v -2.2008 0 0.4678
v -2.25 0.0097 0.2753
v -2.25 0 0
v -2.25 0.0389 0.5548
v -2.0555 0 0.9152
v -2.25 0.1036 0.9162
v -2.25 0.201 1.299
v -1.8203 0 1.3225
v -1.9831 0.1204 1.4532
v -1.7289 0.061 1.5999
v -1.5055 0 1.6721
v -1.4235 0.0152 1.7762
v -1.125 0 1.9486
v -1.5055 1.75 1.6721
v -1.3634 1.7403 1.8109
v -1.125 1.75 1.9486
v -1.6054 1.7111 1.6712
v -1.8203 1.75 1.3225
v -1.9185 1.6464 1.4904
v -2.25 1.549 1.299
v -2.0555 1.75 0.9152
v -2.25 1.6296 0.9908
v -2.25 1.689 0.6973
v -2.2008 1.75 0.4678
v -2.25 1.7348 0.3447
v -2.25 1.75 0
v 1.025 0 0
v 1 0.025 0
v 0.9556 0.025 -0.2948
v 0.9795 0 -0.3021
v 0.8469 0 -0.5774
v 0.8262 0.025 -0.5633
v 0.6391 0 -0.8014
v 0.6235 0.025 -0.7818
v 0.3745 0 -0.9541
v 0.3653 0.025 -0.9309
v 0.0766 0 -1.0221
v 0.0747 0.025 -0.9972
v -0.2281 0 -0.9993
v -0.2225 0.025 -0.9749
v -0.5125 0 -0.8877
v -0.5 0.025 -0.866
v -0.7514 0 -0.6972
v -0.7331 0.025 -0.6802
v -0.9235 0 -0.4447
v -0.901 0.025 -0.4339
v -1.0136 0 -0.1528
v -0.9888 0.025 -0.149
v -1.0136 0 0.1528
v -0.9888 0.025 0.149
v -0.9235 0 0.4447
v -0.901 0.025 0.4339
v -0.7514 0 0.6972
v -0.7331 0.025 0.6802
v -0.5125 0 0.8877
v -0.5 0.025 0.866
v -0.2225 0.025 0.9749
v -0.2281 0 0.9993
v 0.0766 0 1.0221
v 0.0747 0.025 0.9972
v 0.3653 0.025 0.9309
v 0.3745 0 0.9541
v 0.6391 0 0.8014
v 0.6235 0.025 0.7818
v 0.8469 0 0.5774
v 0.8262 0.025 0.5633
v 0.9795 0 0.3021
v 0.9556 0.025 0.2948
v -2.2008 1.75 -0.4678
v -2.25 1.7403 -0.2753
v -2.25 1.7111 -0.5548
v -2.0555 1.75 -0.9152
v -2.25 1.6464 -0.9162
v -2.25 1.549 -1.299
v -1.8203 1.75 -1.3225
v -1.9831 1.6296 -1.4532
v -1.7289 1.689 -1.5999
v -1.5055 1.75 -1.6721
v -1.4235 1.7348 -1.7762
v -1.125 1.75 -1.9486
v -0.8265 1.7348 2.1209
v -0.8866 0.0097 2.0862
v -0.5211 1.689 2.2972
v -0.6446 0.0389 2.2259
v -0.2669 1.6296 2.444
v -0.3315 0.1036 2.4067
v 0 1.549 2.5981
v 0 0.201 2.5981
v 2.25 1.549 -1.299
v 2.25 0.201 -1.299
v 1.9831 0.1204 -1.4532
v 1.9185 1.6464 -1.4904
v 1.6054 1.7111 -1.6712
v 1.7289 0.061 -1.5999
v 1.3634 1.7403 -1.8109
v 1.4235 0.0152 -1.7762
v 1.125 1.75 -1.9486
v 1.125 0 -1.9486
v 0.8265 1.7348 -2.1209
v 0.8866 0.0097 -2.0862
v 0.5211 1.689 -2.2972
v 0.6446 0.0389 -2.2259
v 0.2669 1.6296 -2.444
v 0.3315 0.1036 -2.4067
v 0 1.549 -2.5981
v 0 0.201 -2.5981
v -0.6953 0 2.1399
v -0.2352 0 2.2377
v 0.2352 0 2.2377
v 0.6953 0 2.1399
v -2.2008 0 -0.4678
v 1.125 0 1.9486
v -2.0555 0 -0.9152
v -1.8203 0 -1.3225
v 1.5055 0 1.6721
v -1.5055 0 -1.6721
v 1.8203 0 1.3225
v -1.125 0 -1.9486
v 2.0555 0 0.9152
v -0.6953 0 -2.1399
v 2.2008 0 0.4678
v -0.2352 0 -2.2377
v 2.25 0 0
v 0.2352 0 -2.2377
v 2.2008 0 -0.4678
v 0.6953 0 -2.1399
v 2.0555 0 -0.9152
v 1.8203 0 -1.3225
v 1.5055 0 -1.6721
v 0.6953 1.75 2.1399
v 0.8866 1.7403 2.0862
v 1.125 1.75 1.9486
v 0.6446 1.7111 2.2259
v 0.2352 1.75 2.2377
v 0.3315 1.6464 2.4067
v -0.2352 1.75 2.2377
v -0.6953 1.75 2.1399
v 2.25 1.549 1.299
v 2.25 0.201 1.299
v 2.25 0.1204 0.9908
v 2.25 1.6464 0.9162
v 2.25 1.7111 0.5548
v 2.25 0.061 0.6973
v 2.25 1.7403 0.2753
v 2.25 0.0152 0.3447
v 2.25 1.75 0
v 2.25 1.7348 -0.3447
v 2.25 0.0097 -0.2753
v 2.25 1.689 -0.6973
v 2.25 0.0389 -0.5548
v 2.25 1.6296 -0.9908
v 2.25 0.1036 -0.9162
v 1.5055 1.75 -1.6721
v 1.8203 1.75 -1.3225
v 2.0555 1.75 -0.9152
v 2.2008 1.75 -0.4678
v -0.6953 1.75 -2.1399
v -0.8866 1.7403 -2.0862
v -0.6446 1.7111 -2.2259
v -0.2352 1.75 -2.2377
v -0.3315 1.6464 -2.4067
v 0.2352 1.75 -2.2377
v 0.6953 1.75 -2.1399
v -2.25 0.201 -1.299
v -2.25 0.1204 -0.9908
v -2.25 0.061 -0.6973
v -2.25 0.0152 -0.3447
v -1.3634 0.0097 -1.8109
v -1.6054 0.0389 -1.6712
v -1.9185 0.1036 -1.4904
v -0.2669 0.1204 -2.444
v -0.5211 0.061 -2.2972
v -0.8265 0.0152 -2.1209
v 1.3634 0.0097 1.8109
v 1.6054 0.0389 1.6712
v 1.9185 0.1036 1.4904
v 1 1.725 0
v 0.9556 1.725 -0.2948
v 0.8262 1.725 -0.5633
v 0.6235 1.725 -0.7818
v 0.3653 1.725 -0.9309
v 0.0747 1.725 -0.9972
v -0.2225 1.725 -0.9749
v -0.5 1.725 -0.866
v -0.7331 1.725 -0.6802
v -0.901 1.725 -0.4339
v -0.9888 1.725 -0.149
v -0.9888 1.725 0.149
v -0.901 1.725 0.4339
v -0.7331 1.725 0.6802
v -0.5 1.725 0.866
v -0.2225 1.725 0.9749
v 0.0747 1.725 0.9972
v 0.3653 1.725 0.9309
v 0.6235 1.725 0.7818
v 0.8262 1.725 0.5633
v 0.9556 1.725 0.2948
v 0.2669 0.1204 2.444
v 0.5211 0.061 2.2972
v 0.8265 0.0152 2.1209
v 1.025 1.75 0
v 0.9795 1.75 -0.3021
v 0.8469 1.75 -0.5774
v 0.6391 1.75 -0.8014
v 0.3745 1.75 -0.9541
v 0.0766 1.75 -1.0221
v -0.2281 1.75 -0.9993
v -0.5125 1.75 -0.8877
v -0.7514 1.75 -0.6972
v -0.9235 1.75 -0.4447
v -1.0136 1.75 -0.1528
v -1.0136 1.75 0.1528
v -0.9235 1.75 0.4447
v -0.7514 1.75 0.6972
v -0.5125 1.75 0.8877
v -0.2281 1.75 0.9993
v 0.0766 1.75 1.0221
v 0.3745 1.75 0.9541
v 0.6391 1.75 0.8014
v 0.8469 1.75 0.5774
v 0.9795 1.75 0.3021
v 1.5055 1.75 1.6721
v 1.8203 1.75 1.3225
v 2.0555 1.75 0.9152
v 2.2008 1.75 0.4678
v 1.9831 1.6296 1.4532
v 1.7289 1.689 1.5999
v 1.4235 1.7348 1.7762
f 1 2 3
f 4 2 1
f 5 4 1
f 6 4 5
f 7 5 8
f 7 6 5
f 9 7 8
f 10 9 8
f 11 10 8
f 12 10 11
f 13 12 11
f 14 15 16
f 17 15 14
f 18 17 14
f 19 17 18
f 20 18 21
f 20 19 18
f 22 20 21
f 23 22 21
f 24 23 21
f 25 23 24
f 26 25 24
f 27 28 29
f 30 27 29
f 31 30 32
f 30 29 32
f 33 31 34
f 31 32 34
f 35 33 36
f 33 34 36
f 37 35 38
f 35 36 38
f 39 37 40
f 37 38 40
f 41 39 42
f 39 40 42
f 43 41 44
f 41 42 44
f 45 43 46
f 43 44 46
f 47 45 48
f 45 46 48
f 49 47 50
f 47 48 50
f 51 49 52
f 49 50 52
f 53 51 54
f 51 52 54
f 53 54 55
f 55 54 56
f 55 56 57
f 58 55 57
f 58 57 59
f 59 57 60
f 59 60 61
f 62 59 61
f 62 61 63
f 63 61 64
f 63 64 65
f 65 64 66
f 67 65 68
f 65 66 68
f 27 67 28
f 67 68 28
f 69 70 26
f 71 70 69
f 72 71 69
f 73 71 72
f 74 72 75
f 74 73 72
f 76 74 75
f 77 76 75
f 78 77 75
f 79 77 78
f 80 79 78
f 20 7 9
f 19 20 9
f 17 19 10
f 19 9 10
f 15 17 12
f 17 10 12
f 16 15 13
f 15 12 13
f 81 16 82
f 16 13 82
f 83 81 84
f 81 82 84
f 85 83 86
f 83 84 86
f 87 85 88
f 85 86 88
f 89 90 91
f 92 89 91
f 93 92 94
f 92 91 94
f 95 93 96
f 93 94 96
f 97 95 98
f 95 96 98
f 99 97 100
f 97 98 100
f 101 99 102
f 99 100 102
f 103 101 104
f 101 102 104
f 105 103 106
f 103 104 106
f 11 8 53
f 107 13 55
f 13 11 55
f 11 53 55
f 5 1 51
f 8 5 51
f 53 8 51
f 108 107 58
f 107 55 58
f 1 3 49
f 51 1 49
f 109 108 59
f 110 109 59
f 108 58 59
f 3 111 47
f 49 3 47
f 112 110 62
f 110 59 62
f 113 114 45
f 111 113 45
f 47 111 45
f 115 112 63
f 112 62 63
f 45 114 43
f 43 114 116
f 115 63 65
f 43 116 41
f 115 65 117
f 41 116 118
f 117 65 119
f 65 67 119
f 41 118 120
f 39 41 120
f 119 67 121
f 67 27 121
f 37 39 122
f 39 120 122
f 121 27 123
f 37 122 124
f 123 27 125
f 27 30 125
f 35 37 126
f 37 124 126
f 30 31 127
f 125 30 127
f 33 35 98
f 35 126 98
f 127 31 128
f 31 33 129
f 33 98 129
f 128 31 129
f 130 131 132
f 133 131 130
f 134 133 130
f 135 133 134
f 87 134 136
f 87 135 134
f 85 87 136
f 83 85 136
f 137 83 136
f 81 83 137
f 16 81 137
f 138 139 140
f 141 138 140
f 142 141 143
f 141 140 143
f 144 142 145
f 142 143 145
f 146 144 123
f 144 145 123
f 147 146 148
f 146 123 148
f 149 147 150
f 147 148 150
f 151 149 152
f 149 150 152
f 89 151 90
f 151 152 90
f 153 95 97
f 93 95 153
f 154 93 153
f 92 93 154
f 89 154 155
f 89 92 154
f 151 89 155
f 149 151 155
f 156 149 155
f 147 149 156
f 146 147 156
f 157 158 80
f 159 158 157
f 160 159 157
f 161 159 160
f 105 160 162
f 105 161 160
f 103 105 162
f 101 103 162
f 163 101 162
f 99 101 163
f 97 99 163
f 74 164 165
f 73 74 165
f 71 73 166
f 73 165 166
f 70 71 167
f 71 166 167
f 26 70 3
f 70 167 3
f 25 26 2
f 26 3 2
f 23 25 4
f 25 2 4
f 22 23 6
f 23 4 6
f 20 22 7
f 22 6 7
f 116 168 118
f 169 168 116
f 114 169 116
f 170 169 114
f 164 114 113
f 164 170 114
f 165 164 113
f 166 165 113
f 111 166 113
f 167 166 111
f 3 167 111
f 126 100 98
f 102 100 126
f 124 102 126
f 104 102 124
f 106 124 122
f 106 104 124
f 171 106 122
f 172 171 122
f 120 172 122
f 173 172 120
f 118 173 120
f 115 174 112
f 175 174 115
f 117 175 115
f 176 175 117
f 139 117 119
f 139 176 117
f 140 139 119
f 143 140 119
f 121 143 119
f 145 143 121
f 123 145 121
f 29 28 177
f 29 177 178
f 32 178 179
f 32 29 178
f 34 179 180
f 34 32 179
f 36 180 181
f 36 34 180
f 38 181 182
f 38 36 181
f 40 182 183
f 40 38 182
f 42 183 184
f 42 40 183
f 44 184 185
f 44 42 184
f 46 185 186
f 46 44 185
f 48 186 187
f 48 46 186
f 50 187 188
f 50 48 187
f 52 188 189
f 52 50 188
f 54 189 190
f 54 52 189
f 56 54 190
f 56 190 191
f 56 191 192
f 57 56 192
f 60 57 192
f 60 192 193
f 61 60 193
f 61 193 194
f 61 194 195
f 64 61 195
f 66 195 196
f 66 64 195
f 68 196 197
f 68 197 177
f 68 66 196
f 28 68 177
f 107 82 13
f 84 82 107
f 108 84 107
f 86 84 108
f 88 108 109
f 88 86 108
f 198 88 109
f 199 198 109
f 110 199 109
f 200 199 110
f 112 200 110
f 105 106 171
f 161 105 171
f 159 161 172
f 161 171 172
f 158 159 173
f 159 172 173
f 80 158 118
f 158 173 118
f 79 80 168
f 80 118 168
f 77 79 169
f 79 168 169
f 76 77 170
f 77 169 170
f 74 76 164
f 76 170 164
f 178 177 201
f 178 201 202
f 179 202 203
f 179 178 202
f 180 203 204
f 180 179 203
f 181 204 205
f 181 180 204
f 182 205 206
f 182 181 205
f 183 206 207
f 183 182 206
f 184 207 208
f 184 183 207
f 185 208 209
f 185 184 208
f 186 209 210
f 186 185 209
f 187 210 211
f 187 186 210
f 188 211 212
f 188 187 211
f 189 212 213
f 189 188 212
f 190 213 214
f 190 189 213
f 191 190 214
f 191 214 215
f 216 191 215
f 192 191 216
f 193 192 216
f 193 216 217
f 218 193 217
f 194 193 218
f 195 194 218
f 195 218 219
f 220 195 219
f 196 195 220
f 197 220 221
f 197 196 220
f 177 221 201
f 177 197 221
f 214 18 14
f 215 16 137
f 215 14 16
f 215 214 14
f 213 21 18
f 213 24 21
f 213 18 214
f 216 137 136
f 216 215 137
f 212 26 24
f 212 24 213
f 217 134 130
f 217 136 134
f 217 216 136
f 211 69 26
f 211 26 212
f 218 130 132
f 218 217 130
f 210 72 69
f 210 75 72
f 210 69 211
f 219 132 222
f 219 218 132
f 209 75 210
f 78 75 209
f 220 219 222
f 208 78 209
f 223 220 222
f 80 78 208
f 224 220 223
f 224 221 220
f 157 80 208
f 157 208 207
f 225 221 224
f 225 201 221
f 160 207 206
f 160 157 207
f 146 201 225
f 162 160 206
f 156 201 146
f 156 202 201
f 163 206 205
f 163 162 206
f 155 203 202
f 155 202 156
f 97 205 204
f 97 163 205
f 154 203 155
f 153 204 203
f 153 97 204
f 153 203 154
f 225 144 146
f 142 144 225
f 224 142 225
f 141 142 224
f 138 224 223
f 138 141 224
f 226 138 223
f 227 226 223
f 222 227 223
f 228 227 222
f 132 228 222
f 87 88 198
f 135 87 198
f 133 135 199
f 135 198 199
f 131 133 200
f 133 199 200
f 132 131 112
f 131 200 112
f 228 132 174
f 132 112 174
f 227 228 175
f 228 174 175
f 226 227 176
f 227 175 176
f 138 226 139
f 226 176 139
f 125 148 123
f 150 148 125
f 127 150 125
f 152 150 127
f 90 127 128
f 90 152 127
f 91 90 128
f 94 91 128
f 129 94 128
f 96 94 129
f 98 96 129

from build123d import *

# Parameters (mm, degrees)
SKETCH1_R           = 1
BOSS_EXTRUDE1_DEPTH = 1.75
SKETCH2_OUTSIDE_W   = 13.98
SKETCH2_OUTSIDE_H   = 14.676
SKETCH2_OUTSIDE_R   = 2.25
CUT_EXTRUDE1_DEPTH  = 1.75
CUT_EXTRUDE1_TAPER  = 60
SKETCH3_OUTSIDE_W   = 13.98
SKETCH3_OUTSIDE_H   = 14.676
SKETCH3_OUTSIDE_R   = 2.25
CUT_EXTRUDE3_DEPTH  = 1.75
CUT_EXTRUDE3_TAPER  = 60
CHAMFER1_SIZE       = 0.025


with BuildPart() as part:
    # Sketch1 → Boss-Extrude1 (new body)
    with BuildSketch(Plane(origin=(0, 0, 0), x_dir=(1, 0, 0), z_dir=(0, 1, 0))):
        Polygon((0, -2.598076211), (2.25, -1.299038106), (2.25, 1.299038106), (0, 2.598076211), (-2.25, 1.299038106), (-2.25, -1.299038106), align=None)
        Circle(SKETCH1_R, mode=Mode.SUBTRACT)
    extrude(amount=BOSS_EXTRUDE1_DEPTH)

    # Sketch2 outside → Cut-Extrude1 (cut)
    with BuildSketch(Plane(origin=(0, 1.75, 0), x_dir=(1, 0, 0), z_dir=(0, 1, 0))):
        Rectangle(SKETCH2_OUTSIDE_W, SKETCH2_OUTSIDE_H)
        Circle(SKETCH2_OUTSIDE_R, mode=Mode.SUBTRACT)
    extrude(amount=-CUT_EXTRUDE1_DEPTH, taper=CUT_EXTRUDE1_TAPER, mode=Mode.SUBTRACT)

    # Sketch3 outside → Cut-Extrude3 (cut)
    with BuildSketch(Plane.XZ):
        Rectangle(SKETCH3_OUTSIDE_W, SKETCH3_OUTSIDE_H)
        Circle(SKETCH3_OUTSIDE_R, mode=Mode.SUBTRACT)
    extrude(amount=-CUT_EXTRUDE3_DEPTH, taper=CUT_EXTRUDE3_TAPER, mode=Mode.SUBTRACT)

    # Chamfer1
    chamfer1_edges = [part.edges().sort_by_distance(p)[0] for p in [
        (-1, 0, 0),
        (-1, 1.75, 0),
    ]]
    chamfer(chamfer1_edges, length=CHAMFER1_SIZE)


solid = part.part
